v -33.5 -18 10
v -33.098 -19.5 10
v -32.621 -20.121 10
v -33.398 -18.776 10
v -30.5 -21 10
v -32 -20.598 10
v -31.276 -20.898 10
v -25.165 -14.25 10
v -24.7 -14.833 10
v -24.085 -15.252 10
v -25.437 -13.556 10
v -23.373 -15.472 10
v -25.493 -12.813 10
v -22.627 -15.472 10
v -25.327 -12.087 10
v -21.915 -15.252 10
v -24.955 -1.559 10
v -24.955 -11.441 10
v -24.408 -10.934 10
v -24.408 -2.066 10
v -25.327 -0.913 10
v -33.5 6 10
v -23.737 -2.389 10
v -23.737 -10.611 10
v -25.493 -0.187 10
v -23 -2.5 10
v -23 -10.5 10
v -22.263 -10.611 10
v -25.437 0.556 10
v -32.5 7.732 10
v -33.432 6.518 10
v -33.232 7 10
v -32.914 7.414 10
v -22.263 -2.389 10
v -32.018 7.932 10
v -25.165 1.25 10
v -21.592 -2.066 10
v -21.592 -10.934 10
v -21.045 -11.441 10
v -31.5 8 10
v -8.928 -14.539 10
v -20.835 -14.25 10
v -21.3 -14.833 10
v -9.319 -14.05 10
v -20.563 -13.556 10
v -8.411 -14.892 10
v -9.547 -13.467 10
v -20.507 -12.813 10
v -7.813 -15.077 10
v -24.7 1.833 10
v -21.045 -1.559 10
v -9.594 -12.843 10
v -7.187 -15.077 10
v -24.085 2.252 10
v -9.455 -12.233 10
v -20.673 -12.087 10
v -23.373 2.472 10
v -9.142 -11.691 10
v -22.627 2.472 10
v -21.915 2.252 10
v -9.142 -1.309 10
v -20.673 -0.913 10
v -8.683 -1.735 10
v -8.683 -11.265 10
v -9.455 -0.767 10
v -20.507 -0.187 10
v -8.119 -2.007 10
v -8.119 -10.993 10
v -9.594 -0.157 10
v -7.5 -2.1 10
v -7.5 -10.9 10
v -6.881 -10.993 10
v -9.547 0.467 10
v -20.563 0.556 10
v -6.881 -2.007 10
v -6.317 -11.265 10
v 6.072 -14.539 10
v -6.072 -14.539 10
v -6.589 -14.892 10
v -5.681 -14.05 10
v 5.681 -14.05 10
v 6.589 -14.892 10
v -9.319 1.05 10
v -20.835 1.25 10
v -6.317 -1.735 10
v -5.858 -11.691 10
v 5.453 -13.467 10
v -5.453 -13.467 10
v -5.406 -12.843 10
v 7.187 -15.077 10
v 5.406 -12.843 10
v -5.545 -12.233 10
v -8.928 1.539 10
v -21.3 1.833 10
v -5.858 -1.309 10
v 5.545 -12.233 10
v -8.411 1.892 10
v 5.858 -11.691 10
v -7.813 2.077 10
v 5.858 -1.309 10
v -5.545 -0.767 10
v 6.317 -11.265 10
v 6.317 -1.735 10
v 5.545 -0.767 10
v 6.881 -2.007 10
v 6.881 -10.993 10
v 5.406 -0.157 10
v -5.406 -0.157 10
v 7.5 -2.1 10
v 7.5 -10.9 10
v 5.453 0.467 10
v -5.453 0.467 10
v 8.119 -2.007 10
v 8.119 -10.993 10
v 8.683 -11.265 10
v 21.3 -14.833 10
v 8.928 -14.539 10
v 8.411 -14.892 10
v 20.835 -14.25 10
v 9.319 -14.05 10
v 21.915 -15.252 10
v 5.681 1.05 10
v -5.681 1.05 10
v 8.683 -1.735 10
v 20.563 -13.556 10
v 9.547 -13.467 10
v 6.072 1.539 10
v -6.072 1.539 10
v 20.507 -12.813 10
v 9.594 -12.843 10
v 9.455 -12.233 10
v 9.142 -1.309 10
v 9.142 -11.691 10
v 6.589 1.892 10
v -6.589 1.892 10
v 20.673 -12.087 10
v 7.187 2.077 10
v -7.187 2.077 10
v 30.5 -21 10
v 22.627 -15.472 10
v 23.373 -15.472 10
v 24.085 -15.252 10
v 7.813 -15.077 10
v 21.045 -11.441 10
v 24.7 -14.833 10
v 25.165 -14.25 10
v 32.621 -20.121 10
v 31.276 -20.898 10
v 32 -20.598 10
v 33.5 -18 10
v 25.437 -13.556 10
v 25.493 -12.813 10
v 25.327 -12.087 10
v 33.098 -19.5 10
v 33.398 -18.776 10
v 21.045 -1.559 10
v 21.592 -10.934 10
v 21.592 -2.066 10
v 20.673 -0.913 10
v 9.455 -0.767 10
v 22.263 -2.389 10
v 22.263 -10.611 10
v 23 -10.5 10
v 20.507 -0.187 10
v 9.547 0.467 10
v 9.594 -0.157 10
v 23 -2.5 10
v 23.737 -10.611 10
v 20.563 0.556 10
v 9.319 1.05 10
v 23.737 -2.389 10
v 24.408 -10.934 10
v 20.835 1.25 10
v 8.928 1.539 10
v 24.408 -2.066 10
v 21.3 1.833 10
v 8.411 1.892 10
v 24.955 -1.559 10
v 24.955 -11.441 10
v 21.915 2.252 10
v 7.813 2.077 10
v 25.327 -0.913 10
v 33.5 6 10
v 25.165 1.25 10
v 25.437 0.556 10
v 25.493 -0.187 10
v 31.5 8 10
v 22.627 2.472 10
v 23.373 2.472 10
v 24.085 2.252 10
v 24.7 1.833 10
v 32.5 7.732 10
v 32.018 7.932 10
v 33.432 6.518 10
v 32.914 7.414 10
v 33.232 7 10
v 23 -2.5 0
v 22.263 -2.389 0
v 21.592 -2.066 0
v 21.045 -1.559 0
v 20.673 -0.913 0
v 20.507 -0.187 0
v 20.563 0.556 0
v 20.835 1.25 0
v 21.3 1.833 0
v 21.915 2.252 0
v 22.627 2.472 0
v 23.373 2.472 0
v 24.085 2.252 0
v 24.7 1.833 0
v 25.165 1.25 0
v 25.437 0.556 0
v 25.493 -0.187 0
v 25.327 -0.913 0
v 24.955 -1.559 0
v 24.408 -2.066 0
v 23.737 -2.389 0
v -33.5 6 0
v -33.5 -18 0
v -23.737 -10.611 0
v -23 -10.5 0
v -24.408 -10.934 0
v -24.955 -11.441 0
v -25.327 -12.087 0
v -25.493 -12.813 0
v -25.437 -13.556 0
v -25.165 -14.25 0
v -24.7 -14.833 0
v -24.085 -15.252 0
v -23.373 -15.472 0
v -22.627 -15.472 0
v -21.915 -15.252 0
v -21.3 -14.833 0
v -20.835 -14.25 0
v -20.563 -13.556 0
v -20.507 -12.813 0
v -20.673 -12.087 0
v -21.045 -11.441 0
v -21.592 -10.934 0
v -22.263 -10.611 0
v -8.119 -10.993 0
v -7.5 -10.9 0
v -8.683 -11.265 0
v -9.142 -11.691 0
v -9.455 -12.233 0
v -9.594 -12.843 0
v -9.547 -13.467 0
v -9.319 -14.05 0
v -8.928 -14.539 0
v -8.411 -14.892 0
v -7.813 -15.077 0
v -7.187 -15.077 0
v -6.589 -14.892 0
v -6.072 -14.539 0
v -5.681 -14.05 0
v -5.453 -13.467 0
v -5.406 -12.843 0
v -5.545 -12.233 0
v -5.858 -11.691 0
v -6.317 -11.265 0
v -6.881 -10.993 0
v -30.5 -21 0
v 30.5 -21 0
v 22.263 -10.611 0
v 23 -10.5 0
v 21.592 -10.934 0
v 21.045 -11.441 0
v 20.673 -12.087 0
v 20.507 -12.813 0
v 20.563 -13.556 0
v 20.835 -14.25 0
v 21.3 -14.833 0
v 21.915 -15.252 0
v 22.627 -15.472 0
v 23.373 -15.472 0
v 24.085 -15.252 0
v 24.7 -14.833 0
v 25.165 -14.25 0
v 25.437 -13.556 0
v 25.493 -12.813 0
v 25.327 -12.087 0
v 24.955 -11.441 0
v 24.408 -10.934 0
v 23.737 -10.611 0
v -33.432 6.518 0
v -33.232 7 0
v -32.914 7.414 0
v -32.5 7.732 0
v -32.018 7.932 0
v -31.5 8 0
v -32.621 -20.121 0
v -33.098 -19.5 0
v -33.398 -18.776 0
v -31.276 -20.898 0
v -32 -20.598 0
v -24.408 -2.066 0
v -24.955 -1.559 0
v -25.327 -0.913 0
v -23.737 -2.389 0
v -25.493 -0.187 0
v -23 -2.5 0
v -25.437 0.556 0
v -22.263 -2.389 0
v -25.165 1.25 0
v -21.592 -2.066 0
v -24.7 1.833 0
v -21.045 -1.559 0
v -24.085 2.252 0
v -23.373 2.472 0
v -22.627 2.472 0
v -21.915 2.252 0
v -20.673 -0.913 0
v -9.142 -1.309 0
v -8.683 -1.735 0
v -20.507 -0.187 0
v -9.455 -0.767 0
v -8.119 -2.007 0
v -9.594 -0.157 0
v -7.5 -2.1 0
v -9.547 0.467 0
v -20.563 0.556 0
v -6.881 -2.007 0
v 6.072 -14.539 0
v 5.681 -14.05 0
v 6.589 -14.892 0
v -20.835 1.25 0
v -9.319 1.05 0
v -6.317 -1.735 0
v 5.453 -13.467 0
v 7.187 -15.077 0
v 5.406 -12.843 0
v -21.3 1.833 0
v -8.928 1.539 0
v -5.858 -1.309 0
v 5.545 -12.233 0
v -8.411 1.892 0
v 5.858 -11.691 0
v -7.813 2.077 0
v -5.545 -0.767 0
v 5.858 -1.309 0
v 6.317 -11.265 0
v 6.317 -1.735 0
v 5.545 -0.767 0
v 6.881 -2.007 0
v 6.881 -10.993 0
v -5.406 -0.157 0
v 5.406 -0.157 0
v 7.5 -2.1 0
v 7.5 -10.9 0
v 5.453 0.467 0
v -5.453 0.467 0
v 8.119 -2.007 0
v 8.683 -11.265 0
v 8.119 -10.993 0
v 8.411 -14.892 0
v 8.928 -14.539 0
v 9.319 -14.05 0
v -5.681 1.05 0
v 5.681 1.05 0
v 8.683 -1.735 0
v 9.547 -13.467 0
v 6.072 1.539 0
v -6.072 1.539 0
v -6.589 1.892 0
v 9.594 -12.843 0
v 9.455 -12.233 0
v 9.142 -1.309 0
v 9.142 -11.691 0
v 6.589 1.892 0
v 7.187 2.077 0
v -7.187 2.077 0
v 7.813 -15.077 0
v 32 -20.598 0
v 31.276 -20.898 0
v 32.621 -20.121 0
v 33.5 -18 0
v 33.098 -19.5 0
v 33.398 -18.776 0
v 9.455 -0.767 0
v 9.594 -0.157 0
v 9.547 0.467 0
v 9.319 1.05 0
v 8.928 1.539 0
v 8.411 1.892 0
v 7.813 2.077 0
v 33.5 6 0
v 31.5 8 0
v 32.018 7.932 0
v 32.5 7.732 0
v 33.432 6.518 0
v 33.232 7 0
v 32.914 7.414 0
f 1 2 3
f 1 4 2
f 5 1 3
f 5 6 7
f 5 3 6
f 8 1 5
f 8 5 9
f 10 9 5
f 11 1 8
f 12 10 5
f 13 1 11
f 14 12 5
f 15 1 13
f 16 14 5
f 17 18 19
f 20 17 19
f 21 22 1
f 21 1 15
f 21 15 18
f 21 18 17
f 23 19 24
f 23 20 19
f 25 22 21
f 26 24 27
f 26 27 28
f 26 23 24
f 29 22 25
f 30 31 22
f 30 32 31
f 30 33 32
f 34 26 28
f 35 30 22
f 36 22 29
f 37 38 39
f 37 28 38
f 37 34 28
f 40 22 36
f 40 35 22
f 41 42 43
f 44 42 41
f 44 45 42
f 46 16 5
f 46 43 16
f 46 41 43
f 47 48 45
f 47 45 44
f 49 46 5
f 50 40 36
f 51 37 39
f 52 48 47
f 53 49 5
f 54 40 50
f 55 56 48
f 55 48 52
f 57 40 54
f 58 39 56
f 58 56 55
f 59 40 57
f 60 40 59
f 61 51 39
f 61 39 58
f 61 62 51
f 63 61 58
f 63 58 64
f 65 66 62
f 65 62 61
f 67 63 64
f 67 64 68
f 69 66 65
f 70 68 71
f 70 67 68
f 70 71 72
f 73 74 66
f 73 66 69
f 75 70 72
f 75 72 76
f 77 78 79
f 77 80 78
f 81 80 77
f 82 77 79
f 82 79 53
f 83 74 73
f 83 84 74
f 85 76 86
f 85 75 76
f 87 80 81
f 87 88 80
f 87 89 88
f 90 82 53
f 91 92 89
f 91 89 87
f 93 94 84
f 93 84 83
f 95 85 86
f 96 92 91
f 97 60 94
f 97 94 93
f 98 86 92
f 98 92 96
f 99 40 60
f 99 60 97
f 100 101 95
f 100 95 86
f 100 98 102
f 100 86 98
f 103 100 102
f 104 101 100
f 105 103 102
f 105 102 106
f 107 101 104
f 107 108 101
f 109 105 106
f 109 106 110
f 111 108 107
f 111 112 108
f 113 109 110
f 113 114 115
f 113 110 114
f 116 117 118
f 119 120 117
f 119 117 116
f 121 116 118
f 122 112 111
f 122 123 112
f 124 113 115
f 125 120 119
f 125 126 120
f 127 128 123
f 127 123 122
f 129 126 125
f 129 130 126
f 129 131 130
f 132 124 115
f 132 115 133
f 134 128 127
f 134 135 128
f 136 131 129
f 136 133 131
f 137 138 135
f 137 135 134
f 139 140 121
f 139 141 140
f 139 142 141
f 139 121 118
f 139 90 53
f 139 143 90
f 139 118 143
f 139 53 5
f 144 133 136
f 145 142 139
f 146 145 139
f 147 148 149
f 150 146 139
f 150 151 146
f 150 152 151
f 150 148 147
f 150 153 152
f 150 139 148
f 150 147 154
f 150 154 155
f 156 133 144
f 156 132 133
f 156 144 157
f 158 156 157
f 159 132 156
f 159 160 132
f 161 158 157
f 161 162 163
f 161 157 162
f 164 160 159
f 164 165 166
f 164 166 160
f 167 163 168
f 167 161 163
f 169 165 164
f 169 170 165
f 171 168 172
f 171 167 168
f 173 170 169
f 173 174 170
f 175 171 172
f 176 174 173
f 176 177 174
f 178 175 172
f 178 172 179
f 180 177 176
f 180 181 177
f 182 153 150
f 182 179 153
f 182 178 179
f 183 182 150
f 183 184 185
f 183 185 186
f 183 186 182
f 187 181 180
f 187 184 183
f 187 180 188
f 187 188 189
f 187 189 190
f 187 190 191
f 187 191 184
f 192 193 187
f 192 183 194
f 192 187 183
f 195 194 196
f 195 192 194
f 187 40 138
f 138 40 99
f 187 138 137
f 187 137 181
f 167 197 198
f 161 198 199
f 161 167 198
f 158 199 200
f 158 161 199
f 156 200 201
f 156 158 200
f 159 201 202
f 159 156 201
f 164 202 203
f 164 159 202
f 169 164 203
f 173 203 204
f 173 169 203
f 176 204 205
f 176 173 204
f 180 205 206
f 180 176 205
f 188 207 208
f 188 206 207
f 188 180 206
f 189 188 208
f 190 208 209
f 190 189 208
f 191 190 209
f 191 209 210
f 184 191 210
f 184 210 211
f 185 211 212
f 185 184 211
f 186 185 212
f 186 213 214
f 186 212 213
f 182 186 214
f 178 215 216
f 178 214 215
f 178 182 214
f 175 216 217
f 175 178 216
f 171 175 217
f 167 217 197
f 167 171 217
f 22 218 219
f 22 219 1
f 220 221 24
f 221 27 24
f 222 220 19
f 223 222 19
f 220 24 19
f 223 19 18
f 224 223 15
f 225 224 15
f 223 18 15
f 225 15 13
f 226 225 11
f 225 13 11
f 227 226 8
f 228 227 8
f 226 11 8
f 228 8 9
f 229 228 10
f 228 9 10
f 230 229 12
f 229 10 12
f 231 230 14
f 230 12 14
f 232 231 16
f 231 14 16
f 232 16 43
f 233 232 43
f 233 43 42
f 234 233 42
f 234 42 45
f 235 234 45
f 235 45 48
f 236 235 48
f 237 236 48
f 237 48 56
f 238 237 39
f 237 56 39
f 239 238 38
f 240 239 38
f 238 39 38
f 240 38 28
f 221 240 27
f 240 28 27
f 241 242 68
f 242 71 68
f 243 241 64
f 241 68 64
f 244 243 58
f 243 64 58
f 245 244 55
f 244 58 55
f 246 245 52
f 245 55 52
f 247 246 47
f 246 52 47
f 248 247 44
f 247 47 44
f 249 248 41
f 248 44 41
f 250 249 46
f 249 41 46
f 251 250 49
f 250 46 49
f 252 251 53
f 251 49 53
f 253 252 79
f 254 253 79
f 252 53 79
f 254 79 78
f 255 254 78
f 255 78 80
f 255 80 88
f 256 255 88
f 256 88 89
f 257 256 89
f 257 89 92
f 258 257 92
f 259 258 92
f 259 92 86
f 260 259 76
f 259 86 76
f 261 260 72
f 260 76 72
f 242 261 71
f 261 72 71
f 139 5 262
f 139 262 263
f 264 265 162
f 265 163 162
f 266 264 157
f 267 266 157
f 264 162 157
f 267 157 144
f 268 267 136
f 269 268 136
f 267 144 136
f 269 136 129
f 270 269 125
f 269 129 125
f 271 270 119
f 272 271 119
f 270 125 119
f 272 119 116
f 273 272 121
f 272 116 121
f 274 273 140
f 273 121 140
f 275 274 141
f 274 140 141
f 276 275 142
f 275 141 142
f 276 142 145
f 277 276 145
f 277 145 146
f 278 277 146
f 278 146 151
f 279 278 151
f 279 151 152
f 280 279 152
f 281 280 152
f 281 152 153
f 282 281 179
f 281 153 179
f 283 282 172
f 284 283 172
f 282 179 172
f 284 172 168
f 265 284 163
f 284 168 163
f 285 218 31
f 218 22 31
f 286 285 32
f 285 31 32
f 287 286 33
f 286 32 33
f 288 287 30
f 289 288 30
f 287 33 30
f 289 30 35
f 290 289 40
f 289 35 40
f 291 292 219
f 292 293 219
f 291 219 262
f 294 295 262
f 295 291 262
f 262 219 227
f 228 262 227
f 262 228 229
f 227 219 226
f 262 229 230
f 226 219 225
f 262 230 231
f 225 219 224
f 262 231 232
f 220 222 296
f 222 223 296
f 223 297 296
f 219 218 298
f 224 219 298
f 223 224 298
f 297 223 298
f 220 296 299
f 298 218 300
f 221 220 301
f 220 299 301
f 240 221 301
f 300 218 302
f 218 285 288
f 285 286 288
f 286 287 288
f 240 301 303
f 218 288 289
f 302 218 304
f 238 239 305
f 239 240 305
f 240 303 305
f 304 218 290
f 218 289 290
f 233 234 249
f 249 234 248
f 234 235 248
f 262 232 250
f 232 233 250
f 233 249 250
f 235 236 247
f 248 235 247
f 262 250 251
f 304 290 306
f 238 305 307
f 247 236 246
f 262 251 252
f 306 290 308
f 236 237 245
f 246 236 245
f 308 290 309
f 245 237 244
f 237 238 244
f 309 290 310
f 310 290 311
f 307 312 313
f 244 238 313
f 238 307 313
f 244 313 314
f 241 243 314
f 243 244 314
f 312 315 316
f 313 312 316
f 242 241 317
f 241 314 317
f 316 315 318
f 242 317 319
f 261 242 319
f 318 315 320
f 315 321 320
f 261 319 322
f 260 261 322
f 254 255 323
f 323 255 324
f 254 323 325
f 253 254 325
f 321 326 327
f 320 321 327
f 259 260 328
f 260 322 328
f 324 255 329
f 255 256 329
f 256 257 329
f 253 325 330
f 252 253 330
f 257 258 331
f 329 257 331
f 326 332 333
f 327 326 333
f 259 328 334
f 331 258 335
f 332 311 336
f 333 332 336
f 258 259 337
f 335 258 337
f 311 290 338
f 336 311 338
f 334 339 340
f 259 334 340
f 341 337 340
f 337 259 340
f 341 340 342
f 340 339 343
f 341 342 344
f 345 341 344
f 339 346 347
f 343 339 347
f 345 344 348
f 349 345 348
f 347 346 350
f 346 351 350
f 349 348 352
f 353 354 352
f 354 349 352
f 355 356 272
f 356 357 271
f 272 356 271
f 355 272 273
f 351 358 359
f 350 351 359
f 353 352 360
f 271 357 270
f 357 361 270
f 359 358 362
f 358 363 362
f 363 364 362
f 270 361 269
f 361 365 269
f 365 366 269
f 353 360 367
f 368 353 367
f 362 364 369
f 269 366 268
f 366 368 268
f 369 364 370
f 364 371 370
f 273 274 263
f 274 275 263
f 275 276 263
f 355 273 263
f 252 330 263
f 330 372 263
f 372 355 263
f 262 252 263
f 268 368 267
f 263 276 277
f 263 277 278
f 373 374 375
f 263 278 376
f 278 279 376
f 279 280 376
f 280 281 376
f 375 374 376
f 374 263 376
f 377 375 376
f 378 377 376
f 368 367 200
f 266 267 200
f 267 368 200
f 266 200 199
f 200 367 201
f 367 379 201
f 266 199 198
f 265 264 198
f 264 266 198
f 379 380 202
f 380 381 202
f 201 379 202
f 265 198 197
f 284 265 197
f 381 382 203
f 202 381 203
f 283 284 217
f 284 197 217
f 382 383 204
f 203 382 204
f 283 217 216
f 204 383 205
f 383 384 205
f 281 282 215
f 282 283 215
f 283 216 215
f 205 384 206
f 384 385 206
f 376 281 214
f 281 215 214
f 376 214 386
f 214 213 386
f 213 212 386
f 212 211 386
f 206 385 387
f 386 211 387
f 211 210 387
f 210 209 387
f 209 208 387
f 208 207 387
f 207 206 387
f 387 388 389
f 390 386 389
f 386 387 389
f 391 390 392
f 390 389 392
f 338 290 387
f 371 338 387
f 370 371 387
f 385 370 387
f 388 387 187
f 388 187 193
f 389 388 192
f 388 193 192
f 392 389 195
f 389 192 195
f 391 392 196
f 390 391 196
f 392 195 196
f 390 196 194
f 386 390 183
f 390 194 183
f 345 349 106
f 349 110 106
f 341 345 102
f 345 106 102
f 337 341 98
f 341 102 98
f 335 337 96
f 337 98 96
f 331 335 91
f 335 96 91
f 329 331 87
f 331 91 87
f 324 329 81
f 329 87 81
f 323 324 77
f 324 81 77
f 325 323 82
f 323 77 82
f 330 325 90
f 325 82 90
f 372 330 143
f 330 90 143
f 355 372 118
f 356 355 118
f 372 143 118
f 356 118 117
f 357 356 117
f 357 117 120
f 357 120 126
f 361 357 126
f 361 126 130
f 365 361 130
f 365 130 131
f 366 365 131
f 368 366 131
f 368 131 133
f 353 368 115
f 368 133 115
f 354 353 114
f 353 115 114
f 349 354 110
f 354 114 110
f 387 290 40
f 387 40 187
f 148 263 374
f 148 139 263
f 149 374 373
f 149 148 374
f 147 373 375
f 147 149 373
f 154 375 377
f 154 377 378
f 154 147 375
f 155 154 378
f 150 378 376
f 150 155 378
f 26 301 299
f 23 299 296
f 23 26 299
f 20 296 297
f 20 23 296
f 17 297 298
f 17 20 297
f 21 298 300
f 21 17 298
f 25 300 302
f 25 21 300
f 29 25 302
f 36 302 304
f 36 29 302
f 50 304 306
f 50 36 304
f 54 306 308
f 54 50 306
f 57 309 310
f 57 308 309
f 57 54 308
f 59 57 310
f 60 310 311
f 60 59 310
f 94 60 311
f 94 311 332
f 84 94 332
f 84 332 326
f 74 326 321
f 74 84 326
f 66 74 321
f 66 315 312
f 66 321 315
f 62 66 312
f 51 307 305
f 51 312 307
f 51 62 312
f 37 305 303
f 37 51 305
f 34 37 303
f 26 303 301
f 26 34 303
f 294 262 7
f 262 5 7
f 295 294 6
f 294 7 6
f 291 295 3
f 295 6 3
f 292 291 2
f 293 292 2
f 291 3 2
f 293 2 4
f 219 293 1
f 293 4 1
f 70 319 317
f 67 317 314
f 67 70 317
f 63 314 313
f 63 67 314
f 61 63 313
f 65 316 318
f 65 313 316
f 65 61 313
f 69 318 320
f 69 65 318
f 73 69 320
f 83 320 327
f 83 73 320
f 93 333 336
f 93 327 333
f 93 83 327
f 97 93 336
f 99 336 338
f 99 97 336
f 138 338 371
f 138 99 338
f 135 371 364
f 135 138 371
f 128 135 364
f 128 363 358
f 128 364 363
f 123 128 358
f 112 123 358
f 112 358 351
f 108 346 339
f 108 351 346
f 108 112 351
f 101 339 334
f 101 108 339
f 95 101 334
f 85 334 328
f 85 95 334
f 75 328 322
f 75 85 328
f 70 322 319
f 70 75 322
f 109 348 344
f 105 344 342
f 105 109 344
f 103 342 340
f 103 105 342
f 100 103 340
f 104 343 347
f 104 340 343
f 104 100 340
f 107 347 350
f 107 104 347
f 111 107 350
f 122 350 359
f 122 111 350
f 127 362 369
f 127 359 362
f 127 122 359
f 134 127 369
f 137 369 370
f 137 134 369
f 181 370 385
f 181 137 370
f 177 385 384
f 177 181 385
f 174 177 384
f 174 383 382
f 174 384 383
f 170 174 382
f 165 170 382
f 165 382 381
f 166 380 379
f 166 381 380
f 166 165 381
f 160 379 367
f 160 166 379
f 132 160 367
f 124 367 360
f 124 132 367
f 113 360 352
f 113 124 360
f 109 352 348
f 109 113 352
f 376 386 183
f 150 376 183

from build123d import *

# Parameters (mm, degrees)
SKETCH_1_W                  = 67
SKETCH_1_H                  = 16
EXTRUDE_1_DEPTH             = 10
HOLE_WIZARD_M5_1_AT_2_COUNT = 2
HOLE_WIZARD_M5_1_AT_2_PITCH = 15
HOLE_WIZARD_M6_1_AT_2_COUNT = 2
HOLE_WIZARD_M6_1_AT_2_PITCH = 46
FILLET_1_R                  = 2
SKETCH_8_W                  = 67
SKETCH_8_H                  = 10
EXTRUDE_2_DEPTH             = 13
DELETE_START                = -33.5
DELETE_FACE_1_OUTLINE_W     = 27
DELETE_FACE_1_OUTLINE_H     = 10
DELETE_FACE_1_DEPTH         = 2.5
DELETE_START_2              = 31
DELETE_FACE_2_OUTLINE_W     = 27
DELETE_FACE_2_OUTLINE_H     = 10
DELETE_FACE_2_DEPTH         = 2.5
FILLET_2_R                  = 3


with BuildPart() as part:
    # 草图1 → 凸台-拉伸1 (new body)
    with BuildSketch(Plane.XY):
        Rectangle(SKETCH_1_W, SKETCH_1_H)
    extrude(amount=EXTRUDE_1_DEPTH)

    # 草图4 → M5 螺纹孔1 (revolve, cut)
    with BuildSketch(Plane(origin=(-7.5, 0, 10), x_dir=(0, -1, 0), z_dir=(1, 0, 0))):
        Polygon((0, 0), (0, 13.6618073), (2.1, 12.4), (2.1, 0), align=None)
    hole_wizard_m5_1 = revolve(axis=Axis((-7.5, 0, 16.35), (0, 0, -1)), mode=Mode.SUBTRACT)

    # M5 螺纹孔1 at 2: M5 螺纹孔1 ×2
    with Locations(*[(i * HOLE_WIZARD_M5_1_AT_2_PITCH, 0, 0) for i in range(1, HOLE_WIZARD_M5_1_AT_2_COUNT)]):
        add(hole_wizard_m5_1, mode=Mode.SUBTRACT)

    # 草图7 → M6 螺纹孔1 (revolve, cut)
    with BuildSketch(Plane(origin=(-23, 0, 10), x_dir=(0, -1, 0), z_dir=(1, 0, 0))):
        Polygon((0, 0), (0, 16.502151548), (2.5, 15), (2.5, 0), align=None)
    hole_wizard_m6_1 = revolve(axis=Axis((-23, 0, 16.35), (0, 0, -1)), mode=Mode.SUBTRACT)

    # M6 螺纹孔1 at 2: M6 螺纹孔1 ×2
    with Locations(*[(i * HOLE_WIZARD_M6_1_AT_2_PITCH, 0, 0) for i in range(1, HOLE_WIZARD_M6_1_AT_2_COUNT)]):
        add(hole_wizard_m6_1, mode=Mode.SUBTRACT)

    # 圆角1
    fillet_1_edges = [part.edges().sort_by_distance(p)[0] for p in [
        (33.5, -8, 5),
        (-33.5, -8, 5),
        (-33.5, 8, 5),
        (33.5, 8, 5),
    ]]
    fillet(fillet_1_edges, radius=FILLET_1_R)

    # 草图8 → 凸台-拉伸2 (add)
    with BuildSketch(Plane.XZ.offset(8)):
        with Locations((0, 5)):
            Rectangle(SKETCH_8_W, SKETCH_8_H)
    extrude(amount=EXTRUDE_2_DEPTH)

    # Delete Face 1: read off the stored shape, not the designer's step
    # Delete Face 1 outline → Delete Face 1 (add)
    with BuildSketch(Plane.YZ.offset(DELETE_START)):
        with Locations((-7.5, 5)):
            Rectangle(DELETE_FACE_1_OUTLINE_W, DELETE_FACE_1_OUTLINE_H)
    extrude(amount=DELETE_FACE_1_DEPTH)

    # Delete Face 2: read off the stored shape, not the designer's step
    # Delete Face 2 outline → Delete Face 2 (add)
    with BuildSketch(Plane.YZ.offset(DELETE_START_2)):
        with Locations((-7.5, 5)):
            Rectangle(DELETE_FACE_2_OUTLINE_W, DELETE_FACE_2_OUTLINE_H)
    extrude(amount=DELETE_FACE_2_DEPTH)

    # 镜向1: M5 螺纹孔1, M6 螺纹孔1 across plane
    add(hole_wizard_m5_1.mirror(Plane(origin=(0, -6.5, 0), x_dir=(0, 0, 1), z_dir=(0, -1, 0))), mode=Mode.SUBTRACT)
    add(hole_wizard_m6_1.mirror(Plane(origin=(0, -6.5, 0), x_dir=(0, 0, 1), z_dir=(0, -1, 0))), mode=Mode.SUBTRACT)

    # 镜向1 copy 1 sketch → 镜向1 copy 1 (revolve, cut)
    with BuildSketch(Plane(origin=(7.5, -13, 10), x_dir=(0, 1, 0), z_dir=(1, 0, 0))):
        Polygon((0, 0), (0, -13.6618073), (2.1, -12.4), (2.1, 0), align=None)
    revolve(axis=Axis((7.5, -13, 16.35), (0, 0, 1)), mode=Mode.SUBTRACT)

    # 镜向1 copy 2 sketch → 镜向1 copy 2 (revolve, cut)
    with BuildSketch(Plane(origin=(23, -13, 10), x_dir=(0, 1, 0), z_dir=(1, 0, 0))):
        Polygon((0, 0), (0, -16.502151548), (2.5, -15), (2.5, 0), align=None)
    revolve(axis=Axis((23, -13, 16.35), (0, 0, 1)), mode=Mode.SUBTRACT)

    # 圆角2
    fillet_2_edges = [part.edges().sort_by_distance(p)[0] for p in [
        (-33.5, -21, 5),
        (33.5, -21, 5),
    ]]
    fillet(fillet_2_edges, radius=FILLET_2_R)


solid = part.part
